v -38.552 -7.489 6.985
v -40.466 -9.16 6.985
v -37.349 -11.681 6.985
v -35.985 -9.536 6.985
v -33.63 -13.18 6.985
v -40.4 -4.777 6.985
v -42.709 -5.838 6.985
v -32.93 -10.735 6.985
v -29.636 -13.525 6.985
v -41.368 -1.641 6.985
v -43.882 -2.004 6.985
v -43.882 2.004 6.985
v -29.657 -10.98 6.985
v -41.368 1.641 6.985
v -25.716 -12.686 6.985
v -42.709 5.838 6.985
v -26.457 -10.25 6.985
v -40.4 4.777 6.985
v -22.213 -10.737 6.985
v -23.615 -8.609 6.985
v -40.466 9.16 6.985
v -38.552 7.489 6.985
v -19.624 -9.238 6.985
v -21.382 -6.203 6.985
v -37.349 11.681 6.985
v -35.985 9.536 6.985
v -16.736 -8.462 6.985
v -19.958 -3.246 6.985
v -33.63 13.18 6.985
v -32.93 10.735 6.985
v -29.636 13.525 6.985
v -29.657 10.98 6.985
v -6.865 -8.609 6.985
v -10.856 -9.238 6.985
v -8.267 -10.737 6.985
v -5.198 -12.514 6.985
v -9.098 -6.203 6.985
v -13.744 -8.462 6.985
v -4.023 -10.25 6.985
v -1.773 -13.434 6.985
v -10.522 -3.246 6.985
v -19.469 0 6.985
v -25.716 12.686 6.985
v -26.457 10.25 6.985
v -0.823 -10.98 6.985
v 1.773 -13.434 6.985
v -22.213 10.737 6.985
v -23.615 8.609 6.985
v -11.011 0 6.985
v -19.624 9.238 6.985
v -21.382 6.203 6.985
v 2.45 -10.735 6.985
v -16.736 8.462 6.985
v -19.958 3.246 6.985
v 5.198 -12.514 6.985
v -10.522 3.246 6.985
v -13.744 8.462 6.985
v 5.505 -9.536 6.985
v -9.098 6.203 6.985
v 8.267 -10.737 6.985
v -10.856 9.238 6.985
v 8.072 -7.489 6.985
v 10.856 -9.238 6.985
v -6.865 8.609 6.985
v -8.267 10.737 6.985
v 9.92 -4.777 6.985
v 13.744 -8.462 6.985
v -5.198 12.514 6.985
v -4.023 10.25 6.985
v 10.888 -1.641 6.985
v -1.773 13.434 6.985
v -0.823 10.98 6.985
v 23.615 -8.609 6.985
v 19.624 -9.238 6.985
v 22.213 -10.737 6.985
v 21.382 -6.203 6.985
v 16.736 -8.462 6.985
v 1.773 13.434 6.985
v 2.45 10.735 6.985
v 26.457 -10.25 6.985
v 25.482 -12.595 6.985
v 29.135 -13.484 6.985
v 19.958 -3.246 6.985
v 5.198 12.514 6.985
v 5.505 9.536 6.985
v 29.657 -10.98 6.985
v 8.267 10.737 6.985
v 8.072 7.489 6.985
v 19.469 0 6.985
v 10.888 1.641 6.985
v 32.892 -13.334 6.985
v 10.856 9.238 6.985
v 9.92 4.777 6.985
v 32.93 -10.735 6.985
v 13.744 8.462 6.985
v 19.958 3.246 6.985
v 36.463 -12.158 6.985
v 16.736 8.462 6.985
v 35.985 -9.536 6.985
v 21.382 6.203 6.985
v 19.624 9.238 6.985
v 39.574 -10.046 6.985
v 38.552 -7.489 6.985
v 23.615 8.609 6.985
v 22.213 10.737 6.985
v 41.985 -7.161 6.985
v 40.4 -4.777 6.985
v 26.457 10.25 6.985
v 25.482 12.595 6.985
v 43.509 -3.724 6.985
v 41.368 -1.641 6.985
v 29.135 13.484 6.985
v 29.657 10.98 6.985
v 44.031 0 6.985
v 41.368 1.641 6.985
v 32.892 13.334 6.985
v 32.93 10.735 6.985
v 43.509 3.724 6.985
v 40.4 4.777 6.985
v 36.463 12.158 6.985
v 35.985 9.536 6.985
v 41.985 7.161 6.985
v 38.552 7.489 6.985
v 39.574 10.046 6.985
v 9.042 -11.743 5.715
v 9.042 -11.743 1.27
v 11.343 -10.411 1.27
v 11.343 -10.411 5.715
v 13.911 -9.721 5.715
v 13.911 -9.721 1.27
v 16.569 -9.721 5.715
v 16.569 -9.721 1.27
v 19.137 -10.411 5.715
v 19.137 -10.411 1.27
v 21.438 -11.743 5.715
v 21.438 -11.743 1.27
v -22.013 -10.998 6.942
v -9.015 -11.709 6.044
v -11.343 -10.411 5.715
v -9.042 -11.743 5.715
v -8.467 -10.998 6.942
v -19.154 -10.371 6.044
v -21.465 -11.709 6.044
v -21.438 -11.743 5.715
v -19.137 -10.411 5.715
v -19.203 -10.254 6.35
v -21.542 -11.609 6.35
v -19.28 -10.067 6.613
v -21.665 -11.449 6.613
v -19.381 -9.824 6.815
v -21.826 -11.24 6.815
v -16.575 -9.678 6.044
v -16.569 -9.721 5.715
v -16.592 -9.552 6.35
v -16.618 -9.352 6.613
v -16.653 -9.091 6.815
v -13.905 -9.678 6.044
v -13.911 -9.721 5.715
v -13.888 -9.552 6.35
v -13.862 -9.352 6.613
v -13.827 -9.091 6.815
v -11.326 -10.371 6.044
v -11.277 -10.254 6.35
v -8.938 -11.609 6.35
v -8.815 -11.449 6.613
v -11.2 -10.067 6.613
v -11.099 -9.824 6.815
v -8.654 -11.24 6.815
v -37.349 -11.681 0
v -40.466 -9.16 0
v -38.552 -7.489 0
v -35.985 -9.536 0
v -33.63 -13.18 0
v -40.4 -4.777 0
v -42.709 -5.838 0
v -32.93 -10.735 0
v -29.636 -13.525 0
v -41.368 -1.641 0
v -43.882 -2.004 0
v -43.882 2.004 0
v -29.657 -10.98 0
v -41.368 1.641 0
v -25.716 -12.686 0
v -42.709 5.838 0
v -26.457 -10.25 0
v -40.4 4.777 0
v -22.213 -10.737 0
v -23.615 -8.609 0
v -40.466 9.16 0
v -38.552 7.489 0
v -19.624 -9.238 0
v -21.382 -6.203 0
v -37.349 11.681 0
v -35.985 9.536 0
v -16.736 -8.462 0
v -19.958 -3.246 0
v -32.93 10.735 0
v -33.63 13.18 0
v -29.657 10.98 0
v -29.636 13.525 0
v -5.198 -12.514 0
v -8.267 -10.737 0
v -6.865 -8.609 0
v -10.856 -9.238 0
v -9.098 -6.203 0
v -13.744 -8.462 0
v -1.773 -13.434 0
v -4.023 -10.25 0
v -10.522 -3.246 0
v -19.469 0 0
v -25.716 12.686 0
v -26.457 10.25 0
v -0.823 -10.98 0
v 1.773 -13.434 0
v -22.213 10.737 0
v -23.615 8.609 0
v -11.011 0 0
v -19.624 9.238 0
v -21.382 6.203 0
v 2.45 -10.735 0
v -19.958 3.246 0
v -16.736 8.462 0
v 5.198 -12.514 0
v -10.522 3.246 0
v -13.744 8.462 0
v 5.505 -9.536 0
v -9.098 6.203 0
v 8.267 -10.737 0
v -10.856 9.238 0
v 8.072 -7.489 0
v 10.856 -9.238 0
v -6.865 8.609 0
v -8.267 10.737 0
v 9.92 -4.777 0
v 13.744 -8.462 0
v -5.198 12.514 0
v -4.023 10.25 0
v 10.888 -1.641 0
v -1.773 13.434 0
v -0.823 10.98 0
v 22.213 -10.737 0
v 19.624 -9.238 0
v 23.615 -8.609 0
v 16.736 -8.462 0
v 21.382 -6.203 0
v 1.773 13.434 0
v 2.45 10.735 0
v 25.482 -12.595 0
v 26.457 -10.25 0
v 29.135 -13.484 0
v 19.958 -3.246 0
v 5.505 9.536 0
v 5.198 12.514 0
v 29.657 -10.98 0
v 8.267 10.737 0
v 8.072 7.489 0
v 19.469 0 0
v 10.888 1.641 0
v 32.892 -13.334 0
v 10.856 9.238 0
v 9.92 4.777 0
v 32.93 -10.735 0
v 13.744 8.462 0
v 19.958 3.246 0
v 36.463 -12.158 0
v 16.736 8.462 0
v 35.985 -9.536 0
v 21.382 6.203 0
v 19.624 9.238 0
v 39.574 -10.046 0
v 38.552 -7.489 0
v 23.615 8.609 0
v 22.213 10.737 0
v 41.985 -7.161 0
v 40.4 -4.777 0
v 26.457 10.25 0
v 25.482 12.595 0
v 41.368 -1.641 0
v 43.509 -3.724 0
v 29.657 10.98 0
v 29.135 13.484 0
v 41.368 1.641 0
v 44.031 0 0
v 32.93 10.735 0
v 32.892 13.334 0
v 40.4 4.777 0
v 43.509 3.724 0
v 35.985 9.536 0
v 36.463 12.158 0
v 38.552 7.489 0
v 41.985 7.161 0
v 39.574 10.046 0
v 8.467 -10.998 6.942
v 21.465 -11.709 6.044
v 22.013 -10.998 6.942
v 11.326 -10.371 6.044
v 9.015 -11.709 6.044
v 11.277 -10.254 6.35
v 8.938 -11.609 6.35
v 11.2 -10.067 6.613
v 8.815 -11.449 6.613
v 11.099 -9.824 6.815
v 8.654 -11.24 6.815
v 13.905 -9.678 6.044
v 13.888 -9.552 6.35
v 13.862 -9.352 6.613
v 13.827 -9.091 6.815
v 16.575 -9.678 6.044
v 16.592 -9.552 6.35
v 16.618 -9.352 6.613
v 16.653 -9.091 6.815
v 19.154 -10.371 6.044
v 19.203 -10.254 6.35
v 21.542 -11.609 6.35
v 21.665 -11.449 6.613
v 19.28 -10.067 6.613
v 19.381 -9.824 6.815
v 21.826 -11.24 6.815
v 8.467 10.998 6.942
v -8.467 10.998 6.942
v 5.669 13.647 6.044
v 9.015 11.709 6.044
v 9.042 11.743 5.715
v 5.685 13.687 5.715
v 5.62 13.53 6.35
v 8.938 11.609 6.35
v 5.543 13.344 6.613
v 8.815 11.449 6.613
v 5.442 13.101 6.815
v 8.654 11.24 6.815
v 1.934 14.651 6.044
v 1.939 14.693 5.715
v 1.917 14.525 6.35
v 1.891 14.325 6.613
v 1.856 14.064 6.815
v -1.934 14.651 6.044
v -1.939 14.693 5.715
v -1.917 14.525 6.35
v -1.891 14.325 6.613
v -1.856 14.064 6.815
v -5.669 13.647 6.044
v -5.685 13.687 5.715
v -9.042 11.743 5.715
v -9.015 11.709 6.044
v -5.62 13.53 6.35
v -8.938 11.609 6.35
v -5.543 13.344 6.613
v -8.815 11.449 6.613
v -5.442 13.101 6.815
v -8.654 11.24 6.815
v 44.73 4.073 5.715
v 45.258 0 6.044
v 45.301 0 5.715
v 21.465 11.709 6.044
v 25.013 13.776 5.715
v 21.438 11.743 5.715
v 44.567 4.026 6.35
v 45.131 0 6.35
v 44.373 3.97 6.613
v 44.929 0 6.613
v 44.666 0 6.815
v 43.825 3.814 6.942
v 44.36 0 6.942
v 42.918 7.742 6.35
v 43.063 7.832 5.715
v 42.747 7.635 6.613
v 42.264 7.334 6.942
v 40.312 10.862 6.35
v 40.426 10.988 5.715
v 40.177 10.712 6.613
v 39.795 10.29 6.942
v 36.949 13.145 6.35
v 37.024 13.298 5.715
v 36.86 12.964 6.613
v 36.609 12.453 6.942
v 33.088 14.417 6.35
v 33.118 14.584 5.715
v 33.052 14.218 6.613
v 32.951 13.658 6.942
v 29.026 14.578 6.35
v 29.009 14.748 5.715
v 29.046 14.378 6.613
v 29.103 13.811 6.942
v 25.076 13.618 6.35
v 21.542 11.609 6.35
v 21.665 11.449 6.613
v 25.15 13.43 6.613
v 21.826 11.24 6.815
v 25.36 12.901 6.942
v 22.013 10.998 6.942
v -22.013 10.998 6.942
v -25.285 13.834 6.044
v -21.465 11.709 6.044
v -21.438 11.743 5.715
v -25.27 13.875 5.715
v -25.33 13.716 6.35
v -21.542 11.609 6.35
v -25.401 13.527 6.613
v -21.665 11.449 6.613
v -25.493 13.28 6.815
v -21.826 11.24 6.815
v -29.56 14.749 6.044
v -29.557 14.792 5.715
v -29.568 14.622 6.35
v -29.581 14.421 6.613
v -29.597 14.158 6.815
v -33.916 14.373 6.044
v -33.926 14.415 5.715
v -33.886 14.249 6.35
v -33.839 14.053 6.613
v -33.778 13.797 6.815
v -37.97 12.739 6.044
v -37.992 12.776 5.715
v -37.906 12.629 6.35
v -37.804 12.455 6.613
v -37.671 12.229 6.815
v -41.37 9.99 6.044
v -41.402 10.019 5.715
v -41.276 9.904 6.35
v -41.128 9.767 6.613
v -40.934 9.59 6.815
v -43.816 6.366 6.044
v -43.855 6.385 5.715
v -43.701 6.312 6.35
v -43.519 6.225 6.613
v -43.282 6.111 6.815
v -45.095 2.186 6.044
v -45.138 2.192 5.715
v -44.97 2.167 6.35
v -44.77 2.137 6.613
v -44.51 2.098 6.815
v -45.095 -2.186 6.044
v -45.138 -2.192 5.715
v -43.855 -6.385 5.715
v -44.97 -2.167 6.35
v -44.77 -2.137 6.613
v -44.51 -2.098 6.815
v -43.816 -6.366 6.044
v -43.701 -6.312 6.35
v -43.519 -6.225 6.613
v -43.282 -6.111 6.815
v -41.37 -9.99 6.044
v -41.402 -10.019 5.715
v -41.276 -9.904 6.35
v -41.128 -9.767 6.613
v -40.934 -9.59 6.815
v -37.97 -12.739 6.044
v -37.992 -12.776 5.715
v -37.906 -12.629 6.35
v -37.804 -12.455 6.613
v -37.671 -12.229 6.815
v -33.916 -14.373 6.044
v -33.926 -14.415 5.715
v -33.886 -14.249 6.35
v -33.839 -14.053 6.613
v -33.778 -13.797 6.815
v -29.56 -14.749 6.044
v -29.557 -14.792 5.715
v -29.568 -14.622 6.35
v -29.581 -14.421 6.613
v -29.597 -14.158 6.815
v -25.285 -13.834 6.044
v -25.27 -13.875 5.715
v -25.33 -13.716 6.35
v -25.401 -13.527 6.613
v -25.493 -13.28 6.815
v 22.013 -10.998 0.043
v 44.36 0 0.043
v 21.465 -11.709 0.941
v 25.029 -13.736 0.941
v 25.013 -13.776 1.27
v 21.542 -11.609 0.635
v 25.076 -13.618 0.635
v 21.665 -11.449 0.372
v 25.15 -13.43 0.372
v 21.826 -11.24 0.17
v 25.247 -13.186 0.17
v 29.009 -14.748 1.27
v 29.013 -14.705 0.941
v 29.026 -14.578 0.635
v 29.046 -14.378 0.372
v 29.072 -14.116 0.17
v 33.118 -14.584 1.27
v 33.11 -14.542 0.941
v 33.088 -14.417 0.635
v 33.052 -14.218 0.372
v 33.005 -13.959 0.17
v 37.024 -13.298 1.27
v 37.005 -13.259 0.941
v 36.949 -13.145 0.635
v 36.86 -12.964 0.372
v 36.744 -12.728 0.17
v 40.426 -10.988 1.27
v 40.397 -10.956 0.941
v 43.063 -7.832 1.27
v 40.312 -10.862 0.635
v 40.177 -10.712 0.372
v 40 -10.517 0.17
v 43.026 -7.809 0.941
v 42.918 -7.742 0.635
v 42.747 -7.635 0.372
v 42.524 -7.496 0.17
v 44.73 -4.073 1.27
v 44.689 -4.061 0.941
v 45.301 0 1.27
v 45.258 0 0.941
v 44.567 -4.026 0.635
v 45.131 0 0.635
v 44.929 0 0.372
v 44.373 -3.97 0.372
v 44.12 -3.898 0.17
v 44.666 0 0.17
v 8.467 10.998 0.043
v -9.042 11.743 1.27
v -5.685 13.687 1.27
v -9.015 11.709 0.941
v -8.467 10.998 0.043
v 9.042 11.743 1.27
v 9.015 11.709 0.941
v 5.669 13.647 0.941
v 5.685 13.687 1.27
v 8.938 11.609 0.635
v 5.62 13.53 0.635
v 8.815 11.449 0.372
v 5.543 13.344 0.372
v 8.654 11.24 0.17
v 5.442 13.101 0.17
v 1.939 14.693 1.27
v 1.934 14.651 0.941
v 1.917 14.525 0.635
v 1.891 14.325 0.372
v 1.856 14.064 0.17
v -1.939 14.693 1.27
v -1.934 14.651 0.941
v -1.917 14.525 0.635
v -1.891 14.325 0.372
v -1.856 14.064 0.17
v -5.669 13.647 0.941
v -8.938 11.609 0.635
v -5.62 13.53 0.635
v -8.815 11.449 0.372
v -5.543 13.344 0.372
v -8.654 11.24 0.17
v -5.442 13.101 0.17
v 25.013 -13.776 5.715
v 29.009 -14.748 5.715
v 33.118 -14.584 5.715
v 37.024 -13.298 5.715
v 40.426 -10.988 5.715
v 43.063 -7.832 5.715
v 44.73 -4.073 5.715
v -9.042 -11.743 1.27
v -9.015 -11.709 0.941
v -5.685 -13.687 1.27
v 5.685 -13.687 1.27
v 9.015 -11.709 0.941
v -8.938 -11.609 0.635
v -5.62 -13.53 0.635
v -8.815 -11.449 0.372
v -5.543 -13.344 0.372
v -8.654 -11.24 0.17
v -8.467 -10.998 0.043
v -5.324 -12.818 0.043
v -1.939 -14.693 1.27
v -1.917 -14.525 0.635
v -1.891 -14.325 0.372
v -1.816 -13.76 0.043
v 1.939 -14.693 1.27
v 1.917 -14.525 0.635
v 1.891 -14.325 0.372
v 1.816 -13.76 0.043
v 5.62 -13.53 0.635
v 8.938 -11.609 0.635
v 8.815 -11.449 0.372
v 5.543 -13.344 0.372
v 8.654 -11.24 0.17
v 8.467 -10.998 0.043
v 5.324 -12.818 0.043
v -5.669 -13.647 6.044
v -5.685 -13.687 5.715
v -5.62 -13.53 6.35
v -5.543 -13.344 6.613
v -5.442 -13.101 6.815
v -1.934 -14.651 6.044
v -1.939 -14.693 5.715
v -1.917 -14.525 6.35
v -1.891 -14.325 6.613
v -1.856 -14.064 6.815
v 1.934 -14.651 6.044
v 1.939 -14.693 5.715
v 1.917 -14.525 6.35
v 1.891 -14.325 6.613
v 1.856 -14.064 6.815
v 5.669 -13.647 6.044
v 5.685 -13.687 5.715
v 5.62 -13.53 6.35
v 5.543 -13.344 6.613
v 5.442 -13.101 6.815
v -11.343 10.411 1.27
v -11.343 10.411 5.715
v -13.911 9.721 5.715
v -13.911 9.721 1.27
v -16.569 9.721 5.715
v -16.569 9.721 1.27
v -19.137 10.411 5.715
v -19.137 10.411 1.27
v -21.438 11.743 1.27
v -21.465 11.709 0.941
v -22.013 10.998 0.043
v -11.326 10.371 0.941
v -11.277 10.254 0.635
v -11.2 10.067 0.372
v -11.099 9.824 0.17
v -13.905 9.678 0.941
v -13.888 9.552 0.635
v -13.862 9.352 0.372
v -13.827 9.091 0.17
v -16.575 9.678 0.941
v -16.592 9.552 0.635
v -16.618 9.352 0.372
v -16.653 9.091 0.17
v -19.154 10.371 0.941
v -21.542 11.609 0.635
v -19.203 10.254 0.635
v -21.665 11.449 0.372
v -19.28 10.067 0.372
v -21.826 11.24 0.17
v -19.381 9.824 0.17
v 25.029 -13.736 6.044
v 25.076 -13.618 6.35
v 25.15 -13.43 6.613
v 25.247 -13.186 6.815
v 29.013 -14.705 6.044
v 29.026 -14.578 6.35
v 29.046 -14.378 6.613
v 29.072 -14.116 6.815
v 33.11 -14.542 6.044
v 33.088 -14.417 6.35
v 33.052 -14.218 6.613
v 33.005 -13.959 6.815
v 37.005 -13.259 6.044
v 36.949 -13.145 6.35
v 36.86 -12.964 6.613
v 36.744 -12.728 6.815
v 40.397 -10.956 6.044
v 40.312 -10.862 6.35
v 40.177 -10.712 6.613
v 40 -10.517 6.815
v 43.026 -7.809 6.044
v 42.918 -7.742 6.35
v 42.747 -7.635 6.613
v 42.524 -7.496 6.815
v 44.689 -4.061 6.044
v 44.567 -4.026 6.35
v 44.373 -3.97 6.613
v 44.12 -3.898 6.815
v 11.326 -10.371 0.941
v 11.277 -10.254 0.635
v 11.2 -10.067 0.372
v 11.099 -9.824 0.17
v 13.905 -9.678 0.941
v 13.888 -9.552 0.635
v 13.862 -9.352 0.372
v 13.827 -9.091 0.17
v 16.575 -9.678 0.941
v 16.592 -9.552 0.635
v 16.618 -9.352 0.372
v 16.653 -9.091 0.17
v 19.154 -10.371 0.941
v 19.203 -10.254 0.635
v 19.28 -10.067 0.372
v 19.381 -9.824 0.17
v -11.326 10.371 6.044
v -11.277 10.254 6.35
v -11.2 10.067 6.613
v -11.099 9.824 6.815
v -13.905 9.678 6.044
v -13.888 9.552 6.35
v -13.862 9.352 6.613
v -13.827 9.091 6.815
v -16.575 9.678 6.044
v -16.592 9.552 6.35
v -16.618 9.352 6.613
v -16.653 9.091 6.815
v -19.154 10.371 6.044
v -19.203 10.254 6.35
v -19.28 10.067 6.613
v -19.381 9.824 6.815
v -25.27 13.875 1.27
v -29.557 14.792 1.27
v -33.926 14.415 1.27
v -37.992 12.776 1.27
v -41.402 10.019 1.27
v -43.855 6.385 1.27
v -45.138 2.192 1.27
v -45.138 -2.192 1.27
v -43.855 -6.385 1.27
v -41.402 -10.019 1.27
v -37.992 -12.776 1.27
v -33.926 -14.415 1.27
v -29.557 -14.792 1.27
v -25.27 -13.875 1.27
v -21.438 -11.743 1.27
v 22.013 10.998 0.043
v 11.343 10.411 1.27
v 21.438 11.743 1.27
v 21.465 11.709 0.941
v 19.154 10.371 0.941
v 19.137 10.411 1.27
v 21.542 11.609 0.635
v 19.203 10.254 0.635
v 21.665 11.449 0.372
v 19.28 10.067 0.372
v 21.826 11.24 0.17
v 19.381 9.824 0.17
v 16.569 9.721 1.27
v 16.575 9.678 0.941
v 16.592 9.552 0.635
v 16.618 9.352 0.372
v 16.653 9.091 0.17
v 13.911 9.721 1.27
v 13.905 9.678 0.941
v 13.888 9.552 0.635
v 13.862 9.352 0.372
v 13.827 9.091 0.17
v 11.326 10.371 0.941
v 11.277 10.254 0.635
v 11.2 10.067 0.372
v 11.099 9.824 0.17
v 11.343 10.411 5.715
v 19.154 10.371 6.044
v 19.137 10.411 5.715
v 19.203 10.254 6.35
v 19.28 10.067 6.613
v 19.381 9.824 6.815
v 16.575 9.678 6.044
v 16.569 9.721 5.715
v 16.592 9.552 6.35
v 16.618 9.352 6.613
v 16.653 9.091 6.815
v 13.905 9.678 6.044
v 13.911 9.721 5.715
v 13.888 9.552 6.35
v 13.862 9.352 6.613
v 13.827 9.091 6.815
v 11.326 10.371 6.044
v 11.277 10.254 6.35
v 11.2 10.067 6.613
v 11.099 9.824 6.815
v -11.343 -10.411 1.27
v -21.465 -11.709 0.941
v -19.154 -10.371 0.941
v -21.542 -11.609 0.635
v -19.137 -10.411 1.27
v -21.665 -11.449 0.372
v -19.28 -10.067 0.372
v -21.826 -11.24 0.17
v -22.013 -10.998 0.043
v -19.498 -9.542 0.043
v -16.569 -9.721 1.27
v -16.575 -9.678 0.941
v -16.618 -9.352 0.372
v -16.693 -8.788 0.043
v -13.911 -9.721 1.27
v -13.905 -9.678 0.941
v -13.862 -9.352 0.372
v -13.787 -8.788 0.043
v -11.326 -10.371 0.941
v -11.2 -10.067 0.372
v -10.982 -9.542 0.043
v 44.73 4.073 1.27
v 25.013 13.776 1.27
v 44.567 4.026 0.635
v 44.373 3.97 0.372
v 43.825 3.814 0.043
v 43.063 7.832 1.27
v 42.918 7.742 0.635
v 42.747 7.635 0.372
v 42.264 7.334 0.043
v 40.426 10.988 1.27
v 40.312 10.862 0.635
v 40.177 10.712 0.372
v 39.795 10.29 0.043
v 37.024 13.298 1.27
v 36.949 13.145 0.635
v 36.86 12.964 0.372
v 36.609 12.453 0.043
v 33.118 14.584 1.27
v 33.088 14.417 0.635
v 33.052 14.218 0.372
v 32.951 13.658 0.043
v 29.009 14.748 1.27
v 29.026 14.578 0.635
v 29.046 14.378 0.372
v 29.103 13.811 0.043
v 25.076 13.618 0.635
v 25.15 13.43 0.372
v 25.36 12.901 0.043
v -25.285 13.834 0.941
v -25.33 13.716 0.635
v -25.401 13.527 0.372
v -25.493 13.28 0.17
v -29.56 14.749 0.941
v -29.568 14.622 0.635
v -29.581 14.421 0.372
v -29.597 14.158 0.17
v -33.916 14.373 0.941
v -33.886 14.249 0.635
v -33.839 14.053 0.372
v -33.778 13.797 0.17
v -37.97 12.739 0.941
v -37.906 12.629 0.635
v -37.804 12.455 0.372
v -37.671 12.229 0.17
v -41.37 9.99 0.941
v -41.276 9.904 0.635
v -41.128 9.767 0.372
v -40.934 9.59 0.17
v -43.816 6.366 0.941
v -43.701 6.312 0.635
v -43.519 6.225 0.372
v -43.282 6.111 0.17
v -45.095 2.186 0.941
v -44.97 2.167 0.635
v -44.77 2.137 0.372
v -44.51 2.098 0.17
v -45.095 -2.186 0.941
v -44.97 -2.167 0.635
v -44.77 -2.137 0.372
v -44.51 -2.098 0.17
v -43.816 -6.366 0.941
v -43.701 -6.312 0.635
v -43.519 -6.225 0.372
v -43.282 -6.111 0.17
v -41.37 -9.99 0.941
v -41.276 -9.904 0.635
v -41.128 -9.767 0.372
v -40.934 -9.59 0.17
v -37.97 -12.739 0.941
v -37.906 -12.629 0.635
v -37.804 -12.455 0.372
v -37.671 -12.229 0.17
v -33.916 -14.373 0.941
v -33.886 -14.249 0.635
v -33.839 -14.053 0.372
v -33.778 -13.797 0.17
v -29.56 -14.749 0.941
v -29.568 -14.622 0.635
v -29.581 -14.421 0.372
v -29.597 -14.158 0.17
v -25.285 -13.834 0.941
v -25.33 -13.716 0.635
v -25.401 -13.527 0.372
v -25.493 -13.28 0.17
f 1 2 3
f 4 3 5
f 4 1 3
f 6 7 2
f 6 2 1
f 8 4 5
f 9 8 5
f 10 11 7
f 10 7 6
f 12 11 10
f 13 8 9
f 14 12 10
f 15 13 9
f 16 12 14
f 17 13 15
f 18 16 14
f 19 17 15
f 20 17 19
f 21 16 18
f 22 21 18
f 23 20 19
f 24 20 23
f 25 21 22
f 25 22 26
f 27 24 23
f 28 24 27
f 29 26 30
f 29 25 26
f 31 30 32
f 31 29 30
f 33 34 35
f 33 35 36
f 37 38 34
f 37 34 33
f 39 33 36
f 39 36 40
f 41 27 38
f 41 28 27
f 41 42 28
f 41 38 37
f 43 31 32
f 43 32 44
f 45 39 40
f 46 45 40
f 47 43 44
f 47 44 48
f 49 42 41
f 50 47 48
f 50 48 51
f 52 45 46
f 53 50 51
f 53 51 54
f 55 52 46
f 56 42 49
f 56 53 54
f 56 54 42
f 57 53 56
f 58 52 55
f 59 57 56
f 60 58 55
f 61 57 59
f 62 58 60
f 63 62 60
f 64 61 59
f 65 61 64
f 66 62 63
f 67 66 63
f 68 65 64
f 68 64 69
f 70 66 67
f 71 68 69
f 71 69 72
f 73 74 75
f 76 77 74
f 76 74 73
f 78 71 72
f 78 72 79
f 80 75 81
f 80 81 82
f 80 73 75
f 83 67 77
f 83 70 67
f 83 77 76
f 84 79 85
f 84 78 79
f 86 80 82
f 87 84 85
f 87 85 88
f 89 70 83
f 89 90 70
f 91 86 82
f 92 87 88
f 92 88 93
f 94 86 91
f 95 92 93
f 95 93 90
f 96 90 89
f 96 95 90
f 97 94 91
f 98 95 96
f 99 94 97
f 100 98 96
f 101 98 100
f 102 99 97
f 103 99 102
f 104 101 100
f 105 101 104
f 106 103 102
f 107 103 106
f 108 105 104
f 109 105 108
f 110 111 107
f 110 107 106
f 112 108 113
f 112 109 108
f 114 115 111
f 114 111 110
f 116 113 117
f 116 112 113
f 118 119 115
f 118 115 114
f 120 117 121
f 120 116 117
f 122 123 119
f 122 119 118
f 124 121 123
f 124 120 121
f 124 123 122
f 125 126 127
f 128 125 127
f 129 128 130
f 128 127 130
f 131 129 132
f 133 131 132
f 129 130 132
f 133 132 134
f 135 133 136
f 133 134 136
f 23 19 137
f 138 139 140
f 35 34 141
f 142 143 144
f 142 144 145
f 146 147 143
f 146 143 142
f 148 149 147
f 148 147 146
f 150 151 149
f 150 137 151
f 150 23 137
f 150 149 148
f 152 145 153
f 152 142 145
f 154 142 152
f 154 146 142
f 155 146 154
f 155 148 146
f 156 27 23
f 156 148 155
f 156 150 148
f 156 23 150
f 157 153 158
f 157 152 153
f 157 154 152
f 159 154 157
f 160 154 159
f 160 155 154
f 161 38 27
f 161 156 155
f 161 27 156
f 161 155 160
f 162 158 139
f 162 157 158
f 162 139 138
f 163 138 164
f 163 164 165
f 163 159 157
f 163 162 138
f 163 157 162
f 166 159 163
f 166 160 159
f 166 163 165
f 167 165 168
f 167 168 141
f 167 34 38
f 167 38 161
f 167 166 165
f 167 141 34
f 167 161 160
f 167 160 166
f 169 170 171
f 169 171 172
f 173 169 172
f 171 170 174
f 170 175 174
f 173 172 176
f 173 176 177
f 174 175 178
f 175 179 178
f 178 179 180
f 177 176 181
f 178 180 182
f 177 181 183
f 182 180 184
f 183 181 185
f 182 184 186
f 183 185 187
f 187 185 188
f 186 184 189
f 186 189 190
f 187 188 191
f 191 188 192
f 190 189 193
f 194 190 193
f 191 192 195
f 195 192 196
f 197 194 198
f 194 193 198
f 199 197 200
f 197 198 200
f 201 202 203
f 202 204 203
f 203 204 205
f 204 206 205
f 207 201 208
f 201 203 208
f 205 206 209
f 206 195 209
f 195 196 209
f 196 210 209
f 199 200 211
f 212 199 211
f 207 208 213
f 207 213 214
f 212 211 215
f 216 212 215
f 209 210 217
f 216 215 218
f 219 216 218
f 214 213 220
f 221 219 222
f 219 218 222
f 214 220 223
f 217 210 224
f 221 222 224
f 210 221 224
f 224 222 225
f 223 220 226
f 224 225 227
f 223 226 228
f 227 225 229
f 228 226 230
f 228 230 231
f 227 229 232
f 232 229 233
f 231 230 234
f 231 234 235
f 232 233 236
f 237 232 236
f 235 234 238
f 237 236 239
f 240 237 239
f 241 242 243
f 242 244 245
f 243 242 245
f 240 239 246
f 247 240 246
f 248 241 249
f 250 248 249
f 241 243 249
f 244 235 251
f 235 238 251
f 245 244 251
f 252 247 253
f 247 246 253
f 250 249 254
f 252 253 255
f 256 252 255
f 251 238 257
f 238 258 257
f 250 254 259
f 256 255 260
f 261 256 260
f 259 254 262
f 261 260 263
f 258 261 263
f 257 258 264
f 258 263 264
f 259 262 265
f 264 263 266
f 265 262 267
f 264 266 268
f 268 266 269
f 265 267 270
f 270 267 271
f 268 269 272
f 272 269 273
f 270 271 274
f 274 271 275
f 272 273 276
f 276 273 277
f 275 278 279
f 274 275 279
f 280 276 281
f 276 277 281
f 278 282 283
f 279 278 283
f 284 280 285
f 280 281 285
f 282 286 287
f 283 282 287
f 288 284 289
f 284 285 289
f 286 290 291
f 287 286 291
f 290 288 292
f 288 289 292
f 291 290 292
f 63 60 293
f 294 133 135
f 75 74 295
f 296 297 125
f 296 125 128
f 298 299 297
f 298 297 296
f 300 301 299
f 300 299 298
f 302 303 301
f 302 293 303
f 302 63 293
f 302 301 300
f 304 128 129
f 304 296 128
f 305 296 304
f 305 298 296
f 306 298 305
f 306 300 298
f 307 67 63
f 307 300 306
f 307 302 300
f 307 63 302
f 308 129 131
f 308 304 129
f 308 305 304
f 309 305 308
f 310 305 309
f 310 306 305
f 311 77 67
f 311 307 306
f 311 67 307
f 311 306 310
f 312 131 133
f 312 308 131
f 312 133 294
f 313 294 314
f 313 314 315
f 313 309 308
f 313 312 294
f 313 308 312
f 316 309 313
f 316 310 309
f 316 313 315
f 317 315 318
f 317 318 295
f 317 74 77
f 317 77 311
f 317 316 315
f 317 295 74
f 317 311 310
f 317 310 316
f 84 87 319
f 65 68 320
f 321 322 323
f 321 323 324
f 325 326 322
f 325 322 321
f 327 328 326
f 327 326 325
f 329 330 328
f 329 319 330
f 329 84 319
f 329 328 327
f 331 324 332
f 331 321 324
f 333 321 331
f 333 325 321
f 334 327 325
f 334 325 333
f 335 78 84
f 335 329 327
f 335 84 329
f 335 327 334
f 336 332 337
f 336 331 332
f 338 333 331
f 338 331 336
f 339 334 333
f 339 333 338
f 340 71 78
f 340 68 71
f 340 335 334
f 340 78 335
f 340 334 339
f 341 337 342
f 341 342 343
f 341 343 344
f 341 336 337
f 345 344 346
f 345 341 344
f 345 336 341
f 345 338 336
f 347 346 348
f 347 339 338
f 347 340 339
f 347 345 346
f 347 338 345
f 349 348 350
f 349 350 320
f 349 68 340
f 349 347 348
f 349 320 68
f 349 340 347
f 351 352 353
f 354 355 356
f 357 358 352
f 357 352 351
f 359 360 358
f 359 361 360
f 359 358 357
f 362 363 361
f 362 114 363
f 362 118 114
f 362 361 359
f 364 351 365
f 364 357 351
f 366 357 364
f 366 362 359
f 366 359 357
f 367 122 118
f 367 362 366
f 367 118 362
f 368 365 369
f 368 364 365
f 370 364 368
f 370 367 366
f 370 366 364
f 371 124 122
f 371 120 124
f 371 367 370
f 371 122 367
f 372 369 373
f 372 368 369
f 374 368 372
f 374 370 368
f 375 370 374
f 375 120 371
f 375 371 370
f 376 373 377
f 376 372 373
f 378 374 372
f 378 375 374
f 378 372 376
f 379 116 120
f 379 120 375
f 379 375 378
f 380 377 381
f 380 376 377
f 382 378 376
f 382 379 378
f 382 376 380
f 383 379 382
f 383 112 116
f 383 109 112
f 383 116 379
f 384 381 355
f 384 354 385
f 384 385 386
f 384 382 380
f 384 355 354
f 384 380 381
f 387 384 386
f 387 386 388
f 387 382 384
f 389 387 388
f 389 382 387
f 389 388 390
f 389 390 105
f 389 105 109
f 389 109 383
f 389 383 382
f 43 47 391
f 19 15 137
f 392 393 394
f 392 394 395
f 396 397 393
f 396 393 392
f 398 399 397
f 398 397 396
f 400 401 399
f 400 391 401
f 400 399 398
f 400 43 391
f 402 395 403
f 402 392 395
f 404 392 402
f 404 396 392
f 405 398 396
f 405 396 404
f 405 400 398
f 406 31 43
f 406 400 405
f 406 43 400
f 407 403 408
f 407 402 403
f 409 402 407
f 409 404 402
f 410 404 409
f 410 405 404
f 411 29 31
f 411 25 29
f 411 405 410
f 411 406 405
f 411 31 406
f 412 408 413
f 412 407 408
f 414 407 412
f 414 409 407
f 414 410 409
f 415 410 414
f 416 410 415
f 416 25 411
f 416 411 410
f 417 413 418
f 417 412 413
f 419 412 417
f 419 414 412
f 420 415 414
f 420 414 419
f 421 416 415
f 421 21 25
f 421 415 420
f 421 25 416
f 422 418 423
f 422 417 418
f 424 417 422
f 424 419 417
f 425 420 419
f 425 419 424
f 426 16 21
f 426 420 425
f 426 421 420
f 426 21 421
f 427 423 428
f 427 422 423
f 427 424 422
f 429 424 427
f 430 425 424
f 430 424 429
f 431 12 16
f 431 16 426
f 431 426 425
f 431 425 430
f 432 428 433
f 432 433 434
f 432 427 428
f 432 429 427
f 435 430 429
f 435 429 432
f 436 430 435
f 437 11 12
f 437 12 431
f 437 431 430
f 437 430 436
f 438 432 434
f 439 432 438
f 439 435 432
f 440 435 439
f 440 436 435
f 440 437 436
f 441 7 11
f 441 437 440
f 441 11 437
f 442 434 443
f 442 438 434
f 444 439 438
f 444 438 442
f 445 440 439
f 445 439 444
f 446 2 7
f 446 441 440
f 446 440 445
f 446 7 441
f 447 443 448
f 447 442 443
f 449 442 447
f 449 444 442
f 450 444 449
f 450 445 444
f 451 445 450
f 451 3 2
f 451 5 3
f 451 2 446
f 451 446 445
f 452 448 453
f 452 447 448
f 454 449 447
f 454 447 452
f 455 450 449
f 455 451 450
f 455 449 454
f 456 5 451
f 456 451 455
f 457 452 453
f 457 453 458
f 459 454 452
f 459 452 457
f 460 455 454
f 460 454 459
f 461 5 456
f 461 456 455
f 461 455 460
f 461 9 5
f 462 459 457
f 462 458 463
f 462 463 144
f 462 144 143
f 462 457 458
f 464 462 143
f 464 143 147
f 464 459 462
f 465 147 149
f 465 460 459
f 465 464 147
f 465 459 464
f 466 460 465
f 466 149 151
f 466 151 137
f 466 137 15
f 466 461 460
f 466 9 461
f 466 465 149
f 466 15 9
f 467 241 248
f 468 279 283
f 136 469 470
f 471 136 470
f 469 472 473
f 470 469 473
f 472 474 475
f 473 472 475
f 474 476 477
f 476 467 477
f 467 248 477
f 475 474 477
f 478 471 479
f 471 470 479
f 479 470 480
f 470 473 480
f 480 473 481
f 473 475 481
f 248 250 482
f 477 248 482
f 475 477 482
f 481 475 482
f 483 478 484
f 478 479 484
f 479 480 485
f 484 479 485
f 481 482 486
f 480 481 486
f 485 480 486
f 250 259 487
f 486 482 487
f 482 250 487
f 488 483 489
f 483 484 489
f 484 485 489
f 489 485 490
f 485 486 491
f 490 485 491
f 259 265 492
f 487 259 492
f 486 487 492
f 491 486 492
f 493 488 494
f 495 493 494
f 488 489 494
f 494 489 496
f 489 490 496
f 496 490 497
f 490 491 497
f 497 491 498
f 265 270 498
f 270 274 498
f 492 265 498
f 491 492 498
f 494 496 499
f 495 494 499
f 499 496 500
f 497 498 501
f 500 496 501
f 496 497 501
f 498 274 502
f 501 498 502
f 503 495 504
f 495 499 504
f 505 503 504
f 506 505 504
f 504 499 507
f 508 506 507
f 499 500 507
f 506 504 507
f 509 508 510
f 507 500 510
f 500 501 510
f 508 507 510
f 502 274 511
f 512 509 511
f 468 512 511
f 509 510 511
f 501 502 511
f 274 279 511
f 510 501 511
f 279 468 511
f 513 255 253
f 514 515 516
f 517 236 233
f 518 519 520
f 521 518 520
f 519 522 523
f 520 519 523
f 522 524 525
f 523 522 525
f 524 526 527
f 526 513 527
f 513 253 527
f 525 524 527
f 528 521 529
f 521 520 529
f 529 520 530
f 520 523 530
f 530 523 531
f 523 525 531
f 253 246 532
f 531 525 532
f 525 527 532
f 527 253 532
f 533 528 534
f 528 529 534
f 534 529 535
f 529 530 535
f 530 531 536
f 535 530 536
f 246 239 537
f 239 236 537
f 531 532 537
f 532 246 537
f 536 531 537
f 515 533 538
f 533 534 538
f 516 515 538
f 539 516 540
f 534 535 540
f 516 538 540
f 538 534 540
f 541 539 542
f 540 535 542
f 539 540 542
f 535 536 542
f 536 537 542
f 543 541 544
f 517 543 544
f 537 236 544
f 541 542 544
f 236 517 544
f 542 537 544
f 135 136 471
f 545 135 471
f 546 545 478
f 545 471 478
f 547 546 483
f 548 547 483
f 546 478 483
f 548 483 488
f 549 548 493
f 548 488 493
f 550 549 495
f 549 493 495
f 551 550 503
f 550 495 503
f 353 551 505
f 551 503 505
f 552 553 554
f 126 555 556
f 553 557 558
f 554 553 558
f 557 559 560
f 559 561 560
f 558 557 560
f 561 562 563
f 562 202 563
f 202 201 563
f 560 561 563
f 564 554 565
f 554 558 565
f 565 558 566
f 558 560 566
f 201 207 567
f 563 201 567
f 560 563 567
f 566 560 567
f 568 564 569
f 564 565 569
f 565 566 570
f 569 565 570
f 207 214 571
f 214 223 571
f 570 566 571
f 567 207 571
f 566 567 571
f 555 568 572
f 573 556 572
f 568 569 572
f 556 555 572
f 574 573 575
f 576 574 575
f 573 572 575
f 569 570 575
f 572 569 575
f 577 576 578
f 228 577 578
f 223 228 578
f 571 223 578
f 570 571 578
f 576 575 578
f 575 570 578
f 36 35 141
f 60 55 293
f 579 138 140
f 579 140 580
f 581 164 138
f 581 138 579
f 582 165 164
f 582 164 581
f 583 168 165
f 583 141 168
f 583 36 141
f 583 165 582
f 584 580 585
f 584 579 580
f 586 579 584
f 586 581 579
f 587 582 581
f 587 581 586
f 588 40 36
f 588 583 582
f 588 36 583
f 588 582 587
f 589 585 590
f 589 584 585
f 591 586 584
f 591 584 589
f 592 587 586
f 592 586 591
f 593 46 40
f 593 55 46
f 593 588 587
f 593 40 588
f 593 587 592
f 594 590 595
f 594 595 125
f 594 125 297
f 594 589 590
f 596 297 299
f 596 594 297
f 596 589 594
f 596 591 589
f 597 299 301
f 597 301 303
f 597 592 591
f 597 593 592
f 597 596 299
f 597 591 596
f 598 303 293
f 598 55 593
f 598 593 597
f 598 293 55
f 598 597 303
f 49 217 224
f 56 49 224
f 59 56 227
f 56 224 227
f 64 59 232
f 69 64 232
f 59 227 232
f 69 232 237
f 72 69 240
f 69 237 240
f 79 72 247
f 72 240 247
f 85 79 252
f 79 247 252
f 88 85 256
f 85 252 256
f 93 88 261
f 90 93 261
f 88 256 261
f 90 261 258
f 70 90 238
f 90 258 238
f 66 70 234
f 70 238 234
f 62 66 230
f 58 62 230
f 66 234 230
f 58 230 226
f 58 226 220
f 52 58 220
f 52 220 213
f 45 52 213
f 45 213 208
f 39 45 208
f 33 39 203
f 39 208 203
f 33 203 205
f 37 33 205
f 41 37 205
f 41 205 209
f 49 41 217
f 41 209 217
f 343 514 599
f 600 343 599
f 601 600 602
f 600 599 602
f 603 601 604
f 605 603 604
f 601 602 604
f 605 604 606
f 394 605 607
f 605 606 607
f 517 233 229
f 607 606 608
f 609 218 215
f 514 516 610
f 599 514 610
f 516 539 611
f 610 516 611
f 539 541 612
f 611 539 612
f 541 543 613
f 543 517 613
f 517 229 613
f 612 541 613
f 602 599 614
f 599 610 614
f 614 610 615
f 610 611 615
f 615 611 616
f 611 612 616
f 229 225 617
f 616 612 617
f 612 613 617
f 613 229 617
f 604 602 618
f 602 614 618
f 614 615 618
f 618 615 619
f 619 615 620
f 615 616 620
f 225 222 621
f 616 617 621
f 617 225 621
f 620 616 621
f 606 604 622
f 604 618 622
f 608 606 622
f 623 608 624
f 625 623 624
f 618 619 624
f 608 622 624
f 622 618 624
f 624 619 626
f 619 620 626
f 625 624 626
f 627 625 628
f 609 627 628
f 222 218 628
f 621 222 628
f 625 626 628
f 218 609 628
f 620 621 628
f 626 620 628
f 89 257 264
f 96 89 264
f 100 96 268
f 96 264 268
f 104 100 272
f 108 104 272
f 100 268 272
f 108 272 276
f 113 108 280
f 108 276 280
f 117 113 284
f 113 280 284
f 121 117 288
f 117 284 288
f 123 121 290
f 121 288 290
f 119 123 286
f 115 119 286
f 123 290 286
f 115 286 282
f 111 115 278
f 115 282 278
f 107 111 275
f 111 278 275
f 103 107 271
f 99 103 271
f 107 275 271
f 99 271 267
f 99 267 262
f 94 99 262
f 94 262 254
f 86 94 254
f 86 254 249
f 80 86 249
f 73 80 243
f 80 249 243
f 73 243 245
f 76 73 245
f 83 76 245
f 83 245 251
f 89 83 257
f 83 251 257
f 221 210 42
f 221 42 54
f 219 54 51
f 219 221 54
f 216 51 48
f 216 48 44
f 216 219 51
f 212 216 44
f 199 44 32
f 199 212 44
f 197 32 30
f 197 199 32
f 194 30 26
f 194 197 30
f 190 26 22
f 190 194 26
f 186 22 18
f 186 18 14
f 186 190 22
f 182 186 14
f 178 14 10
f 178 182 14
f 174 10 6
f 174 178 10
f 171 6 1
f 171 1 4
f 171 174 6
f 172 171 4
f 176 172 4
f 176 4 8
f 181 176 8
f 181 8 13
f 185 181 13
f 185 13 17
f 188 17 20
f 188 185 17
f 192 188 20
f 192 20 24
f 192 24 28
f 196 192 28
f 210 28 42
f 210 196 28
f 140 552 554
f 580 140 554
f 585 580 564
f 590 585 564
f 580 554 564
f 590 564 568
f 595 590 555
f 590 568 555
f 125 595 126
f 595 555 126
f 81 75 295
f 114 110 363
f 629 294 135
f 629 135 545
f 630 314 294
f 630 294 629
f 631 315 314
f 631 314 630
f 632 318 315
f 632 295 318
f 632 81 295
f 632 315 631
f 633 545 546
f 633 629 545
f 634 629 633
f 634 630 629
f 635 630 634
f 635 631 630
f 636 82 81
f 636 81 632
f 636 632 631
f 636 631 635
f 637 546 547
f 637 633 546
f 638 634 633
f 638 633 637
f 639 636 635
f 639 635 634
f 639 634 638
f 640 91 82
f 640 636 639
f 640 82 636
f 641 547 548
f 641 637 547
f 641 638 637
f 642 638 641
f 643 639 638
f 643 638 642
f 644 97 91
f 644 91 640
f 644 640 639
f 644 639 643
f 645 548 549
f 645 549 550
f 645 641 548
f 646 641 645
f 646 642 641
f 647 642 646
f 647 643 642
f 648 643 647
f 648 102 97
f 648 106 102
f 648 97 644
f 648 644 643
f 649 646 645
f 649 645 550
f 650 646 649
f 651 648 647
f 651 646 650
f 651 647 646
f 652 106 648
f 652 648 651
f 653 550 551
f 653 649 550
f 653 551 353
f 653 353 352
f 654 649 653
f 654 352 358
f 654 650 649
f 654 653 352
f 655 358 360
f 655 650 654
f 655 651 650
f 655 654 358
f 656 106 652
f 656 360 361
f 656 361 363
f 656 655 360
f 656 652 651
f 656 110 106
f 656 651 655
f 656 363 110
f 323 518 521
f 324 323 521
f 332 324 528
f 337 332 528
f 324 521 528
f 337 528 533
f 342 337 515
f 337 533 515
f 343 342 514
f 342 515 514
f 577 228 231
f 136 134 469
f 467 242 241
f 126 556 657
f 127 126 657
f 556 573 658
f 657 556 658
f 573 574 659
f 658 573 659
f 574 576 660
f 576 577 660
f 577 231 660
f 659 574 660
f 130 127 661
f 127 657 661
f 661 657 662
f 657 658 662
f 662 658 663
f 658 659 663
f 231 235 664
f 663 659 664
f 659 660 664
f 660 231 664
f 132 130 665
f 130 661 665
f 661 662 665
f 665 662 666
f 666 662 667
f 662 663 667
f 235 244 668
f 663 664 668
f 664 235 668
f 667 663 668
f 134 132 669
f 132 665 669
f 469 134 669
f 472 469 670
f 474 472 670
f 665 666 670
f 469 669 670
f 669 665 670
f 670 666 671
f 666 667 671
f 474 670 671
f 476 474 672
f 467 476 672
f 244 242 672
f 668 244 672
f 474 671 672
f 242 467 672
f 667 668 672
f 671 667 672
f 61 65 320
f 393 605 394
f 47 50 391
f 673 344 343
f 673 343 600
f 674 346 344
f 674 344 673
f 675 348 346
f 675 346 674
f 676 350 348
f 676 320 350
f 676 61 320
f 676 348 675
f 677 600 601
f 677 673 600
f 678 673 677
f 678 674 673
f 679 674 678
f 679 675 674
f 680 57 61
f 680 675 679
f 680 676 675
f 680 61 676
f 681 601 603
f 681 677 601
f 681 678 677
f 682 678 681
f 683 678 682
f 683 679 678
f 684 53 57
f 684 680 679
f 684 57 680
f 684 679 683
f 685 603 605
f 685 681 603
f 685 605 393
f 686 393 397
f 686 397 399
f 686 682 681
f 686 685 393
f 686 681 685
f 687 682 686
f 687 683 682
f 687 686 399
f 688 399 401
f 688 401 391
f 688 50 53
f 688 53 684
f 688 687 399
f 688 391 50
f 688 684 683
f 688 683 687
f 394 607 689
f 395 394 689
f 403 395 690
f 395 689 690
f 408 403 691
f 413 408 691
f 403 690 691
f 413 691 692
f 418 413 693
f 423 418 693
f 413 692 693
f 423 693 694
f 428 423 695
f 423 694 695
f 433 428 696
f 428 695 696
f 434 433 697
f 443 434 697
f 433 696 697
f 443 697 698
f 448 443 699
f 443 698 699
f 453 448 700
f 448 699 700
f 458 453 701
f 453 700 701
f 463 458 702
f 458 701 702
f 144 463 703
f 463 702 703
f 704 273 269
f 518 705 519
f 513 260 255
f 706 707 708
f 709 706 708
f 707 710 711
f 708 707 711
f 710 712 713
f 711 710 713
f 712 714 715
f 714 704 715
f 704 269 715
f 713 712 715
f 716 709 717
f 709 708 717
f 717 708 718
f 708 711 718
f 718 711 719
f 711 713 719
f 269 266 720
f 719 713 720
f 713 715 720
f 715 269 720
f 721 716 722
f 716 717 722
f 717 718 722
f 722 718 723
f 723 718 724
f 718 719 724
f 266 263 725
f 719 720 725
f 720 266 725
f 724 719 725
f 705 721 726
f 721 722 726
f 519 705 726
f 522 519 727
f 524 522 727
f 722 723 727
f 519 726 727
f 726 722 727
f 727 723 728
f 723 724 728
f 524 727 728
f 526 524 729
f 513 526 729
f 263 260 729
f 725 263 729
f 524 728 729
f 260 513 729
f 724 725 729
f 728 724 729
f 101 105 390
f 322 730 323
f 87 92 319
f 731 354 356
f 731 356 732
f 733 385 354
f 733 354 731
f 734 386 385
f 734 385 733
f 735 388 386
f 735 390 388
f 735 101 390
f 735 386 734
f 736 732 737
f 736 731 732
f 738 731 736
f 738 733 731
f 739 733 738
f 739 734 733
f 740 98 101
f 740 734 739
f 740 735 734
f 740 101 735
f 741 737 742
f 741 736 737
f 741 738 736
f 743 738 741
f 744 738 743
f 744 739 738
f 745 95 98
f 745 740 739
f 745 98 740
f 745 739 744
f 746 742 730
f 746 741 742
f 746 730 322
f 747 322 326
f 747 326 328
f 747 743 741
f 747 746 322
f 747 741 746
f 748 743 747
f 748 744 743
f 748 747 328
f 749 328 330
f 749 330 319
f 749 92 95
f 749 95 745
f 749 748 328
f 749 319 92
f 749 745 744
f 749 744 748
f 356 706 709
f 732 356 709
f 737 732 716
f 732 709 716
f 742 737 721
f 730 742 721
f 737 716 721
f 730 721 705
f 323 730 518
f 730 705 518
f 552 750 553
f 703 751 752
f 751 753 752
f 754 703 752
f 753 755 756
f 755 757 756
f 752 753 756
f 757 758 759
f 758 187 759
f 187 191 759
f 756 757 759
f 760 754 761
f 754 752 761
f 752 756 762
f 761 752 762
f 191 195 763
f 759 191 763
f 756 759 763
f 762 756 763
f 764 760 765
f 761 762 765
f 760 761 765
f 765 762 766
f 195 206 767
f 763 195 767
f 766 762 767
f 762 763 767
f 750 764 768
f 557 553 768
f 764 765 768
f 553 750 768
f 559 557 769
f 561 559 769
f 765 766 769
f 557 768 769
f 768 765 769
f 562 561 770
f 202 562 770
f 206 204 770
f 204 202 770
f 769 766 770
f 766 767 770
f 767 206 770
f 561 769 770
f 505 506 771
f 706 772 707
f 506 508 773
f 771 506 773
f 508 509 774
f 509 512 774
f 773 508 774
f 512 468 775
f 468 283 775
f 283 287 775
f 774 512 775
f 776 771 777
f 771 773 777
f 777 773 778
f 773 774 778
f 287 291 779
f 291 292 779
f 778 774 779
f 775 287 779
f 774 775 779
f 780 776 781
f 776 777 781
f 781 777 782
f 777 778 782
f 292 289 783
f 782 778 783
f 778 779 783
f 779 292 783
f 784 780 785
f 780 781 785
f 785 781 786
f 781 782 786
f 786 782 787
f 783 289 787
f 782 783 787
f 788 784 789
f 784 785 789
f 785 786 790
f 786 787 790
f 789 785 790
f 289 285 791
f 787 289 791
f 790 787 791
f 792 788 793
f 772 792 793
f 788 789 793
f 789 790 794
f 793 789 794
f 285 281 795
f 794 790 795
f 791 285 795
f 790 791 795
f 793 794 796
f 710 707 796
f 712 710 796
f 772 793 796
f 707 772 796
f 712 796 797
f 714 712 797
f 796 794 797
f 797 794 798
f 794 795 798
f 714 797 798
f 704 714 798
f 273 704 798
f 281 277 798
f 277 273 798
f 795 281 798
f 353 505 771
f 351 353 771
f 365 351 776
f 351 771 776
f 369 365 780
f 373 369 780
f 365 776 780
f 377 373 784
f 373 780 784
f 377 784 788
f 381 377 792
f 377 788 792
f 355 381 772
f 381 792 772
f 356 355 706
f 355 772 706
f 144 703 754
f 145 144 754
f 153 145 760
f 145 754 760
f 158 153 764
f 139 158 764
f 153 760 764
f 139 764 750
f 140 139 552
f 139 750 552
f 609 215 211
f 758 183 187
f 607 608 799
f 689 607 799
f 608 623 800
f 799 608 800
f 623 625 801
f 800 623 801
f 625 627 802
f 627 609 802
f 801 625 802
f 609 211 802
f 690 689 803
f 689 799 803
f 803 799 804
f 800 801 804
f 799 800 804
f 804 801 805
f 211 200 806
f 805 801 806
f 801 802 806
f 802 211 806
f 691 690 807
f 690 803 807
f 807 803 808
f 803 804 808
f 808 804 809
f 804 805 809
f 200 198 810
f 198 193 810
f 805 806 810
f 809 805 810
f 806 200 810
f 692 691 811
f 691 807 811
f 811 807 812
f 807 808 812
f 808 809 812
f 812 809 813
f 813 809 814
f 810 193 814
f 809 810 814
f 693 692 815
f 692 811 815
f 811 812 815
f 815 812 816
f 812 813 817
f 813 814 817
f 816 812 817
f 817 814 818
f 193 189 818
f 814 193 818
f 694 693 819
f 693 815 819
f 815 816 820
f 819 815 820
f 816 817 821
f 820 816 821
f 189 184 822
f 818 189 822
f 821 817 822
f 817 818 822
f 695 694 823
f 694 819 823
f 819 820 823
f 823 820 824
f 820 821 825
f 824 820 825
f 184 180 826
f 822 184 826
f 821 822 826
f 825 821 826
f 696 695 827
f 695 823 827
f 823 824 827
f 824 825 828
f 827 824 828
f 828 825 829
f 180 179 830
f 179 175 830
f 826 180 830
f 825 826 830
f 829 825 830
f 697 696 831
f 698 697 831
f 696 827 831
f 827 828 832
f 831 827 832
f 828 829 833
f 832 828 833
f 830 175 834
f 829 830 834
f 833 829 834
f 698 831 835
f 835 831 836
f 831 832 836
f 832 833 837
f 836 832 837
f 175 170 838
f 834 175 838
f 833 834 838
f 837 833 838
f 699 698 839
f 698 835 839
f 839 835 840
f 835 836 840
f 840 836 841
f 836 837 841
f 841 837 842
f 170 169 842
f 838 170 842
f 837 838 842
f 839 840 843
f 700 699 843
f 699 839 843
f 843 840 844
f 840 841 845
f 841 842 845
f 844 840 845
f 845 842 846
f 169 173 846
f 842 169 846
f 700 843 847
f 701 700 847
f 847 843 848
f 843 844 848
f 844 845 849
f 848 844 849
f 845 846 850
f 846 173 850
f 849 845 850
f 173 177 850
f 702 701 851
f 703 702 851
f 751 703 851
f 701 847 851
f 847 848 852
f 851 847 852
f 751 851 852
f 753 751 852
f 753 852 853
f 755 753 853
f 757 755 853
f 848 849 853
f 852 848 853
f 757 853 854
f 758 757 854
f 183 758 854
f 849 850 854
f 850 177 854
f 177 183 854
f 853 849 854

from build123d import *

# Parameters (mm, degrees)
F0_R     = 11.0109
F1_DEPTH = 6.985
F2_R     = 1.27
F3_R     = 1.27


with BuildPart() as f1:
    # F0 (on Top) → F1 (new body)
    with BuildSketch(Plane.XY):
        with BuildLine():
            Line((14.8209, 0), (11.0109, 0))
            ThreePointArc((11.0109, 0), (0, -11.0109), (-11.0109, 0))
            Line((-11.0109, 0), (-14.8209, 0))
            ThreePointArc((-14.8209, 0), (-13.2978500338, -6.5441776634), (-9.0417285206, -11.7433479966))
            ThreePointArc((-9.0417285206, -11.7433479966), (0, -14.8209), (9.0417285206, -11.7433479966))
            ThreePointArc((9.0417285206, -11.7433479966), (13.2978500338, -6.5441776634), (14.8209, 0))
        make_face()
        with BuildLine():
            ThreePointArc((-11.0109, 0), (0, 11.0109), (11.0109, 0))
            Line((11.0109, 0), (14.8209, 0))
            ThreePointArc((14.8209, 0), (13.2978500338, 6.5441776634), (9.0417285206, 11.7433479966))
            ThreePointArc((9.0417285206, 11.7433479966), (0, 14.8209), (-9.0417285206, 11.7433479966))
            ThreePointArc((-9.0417285206, 11.7433479966), (-13.2978500338, 6.5441776634), (-14.8209, 0))
            Line((-14.8209, 0), (-11.0109, 0))
        make_face()
        with BuildLine():
            ThreePointArc((9.0417285206, 11.7433479966), (13.2978500338, 6.5441776634), (14.8209, 0))
            Line((14.8209, 0), (15.6591, 0))
            ThreePointArc((15.6591, 0), (17.1821499662, 6.5441776634), (21.4382714794, 11.7433479966))
            ThreePointArc((21.4382714794, 11.7433479966), (15.24, 9.6336293996), (9.0417285206, 11.7433479966))
        make_face()
        with BuildLine():
            Line((15.6591, 0), (14.8209, 0))
            ThreePointArc((14.8209, 0), (13.2978500338, -6.5441776634), (9.0417285206, -11.7433479966))
            ThreePointArc((9.0417285206, -11.7433479966), (15.24, -9.6336293996), (21.4382714794, -11.7433479966))
            ThreePointArc((21.4382714794, -11.7433479966), (17.1821499662, -6.5441776634), (15.6591, 0))
        make_face()
        with BuildLine():
            ThreePointArc((-9.0417285206, -11.7433479966), (-13.2978500338, -6.5441776634), (-14.8209, 0))
            Line((-14.8209, 0), (-15.6591, 0))
            ThreePointArc((-15.6591, 0), (-17.1821499662, -6.5441776634), (-21.4382714794, -11.7433479966))
            ThreePointArc((-21.4382714794, -11.7433479966), (-15.24, -9.6336293996), (-9.0417285206, -11.7433479966))
        make_face()
        with BuildLine():
            Line((-15.6591, 0), (-14.8209, 0))
            ThreePointArc((-14.8209, 0), (-13.2978500338, 6.5441776634), (-9.0417285206, 11.7433479966))
            ThreePointArc((-9.0417285206, 11.7433479966), (-15.24, 9.6336293996), (-21.4382714794, 11.7433479966))
            ThreePointArc((-21.4382714794, 11.7433479966), (-17.1821499662, 6.5441776634), (-15.6591, 0))
        make_face()
        with BuildLine():
            ThreePointArc((21.4382714794, 11.7433479966), (17.1821499662, 6.5441776634), (15.6591, 0))
            ThreePointArc((15.6591, 0), (17.1821499662, -6.5441776634), (21.4382714794, -11.7433479966))
            ThreePointArc((21.4382714794, -11.7433479966), (37.0241776634, -13.2978500338), (45.3009, 0))
            ThreePointArc((45.3009, 0), (37.0241776634, 13.2978500338), (21.4382714794, 11.7433479966))
        make_face()
        with BuildLine():
            ThreePointArc((41.4909, 0), (30.48, -11.0109), (19.4691, 0))
            ThreePointArc((19.4691, 0), (30.48, 11.0109), (41.4909, 0))
        make_face(mode=Mode.SUBTRACT)
        with BuildLine():
            ThreePointArc((-21.4382714794, -11.7433479966), (-17.1821499662, -6.5441776634), (-15.6591, 0))
            ThreePointArc((-15.6591, 0), (-17.1821499662, 6.5441776634), (-21.4382714794, 11.7433479966))
            ThreePointArc((-21.4382714794, 11.7433479966), (-45.3009, 0), (-21.4382714794, -11.7433479966))
        make_face()
        with Locations((-30.48, 0)):
            Circle(F0_R, mode=Mode.SUBTRACT)
    extrude(amount=F1_DEPTH)

    # F2
    f2_edges = [f1.edges().sort_by_distance(p)[0] for p in [
        (-21.438271, -11.743348, 3.4925),
        (-15.24, 9.633629, 6.985),
    ]]
    fillet(f2_edges, radius=F2_R)

    # F3
    f3_edges = [f1.edges().sort_by_distance(p)[0] for p in [
        (0, -14.8209, 0),
    ]]
    fillet(f3_edges, radius=F3_R)


solid = f1.part
